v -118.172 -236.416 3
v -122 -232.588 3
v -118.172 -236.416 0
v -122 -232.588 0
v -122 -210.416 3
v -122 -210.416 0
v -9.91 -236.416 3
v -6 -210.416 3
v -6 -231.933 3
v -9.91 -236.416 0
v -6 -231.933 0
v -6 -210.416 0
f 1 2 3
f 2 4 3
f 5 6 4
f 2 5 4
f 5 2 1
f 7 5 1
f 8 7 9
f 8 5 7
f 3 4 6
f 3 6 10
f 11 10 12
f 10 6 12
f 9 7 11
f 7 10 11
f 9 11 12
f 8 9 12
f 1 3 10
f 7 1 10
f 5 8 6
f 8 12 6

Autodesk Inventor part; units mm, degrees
ref_plane "YZ Plane" through (0, 0, 0) normal (1, 0, 0) x (0, 1, 0)
ref_plane "XZ Plane" through (0, 0, 0) normal (0, 1, 0) x (-1, 0, 0)
ref_plane "Work Plane1" through (0, 0, 0) normal (0, 0, 1) x (1, 0, 0)
sketch "Sketch1" plane through (0, 0, 0) normal (0, 0, 1) x (1, 0, 0)
  line L0 (-109, -242.4163) -> (-109, -238.4163)
  line L1 (-119, -238.4163) -> (-109, -238.4163)
  arc A0 (-124, -233.4163) -> (-119, -238.4163) centre (-119, -233.4163) ccw
  line L2 (-124, -154.5344) -> (-124, -233.4163)
  arc A1 (-123.8494, -153.3167) -> (-124, -154.5344) centre (-119, -154.5344) ccw
  line L3 (-103.571, -72.5602) -> (-123.8494, -153.3167)
  arc A2 (-103.1284, -71.4158) -> (-103.571, -72.5602) centre (-98.7216, -73.7779) ccw
  line L4 (-68.4069, -6.6379) -> (-103.1284, -71.4158)
  arc A3 (-59.5931, -6.6379) -> (-68.4069, -6.6379) centre (-64, -9) ccw
  line L5 (-24.8716, -71.4158) -> (-59.5931, -6.6379)
  arc A4 (-24.429, -72.5602) -> (-24.8716, -71.4158) centre (-29.2784, -73.7779) ccw
  line L6 (-4.1506, -153.3167) -> (-24.429, -72.5602)
  arc A5 (-4, -154.5344) -> (-4.1506, -153.3167) centre (-9, -154.5344) ccw
  line L7 (-4, -233.4163) -> (-4, -154.5344)
  arc A6 (-9, -238.4163) -> (-4, -233.4163) centre (-9, -233.4163) ccw
  line L8 (-19, -238.4163) -> (-9, -238.4163)
  line L9 (-19, -238.4163) -> (-19, -242.4163)
  line L10 (-9, -242.4163) -> (-19, -242.4163)
  arc A7 (-9, -242.4163) -> (0, -233.4163) centre (-9, -233.4163) ccw
  line L11 (0, -154.5344) -> (0, -233.4163)
  arc A8 (0, -154.5344) -> (-0.271, -152.3425) centre (-9, -154.5344) ccw
  line L12 (-20.5494, -71.586) -> (-0.271, -152.3425)
  arc A9 (-20.5494, -71.586) -> (-21.3461, -69.5261) centre (-29.2784, -73.7779) ccw
  line L13 (-56.0677, -4.7482) -> (-21.3461, -69.5261)
  arc A10 (-56.0677, -4.7482) -> (-71.9323, -4.7482) centre (-64, -9) ccw
  line L14 (-106.6539, -69.5261) -> (-71.9323, -4.7482)
  arc A11 (-106.6539, -69.5261) -> (-107.4506, -71.586) centre (-98.7216, -73.7779) ccw
  line L15 (-127.729, -152.3425) -> (-107.4506, -71.586)
  arc A12 (-127.729, -152.3425) -> (-128, -154.5344) centre (-119, -154.5344) ccw
  line L16 (-128, -233.4163) -> (-128, -154.5344)
  arc A13 (-128, -233.4163) -> (-119, -242.4163) centre (-119, -233.4163) ccw
  line L17 (-109, -242.4163) -> (-119, -242.4163)
  line L18 (-124, -208.4163) -> (-4, -208.4163)
  line L19 (-4, -208.4163) -> (-4, -232.6822)
  line L20 (-9, -238.4163) -> (-119, -238.4163)
  line L21 (-124, -233.4163) -> (-124, -208.4163)
  line L22 (-119, -238.4163) -> (-124, -233.4163)
  line L23 (-9, -238.4163) -> (-4, -232.6822)
  line L24 (-118.1716, -236.4163) -> (-9.9096, -236.4163)
  line L25 (-9.9096, -236.4163) -> (-6, -231.9327)
  line L26 (-6, -231.9327) -> (-6, -210.4163)
  line L27 (-6, -210.4163) -> (-122, -210.4163)
  line L28 (-122, -210.4163) -> (-122, -232.5878)
  line L29 (-122, -232.5878) -> (-118.1716, -236.4163)
  point P0 (0, 0)
  dimension "d3" = 45
  dimension "d4" = 41.088
  dimension "d5" = 30
  dimension "d6" = 2
extrude "Plate1" add sketch "Sketch1" along normal blind 3 contours L29 L28 L27 L26 L25 L24
ref_plane "midtplan" through (-64, -232.5878, 0) normal (-1, 0, 0) x (0, 0, 1)
equation "\"d7\" = Thickness"
equation "\"Thickness\" = pladetykkelse"
equation "\"BendRadius\" = 1.5 * Thickness"
equation "\"BendReliefWidth\" = Thickness"
equation "\"BendReliefDepth\" = 0.5 * Thickness"
equation "\"CornerReliefSize\" = 4 * Thickness"
equation "\"MinimumRemnant\" = 2 * Thickness"
equation "\"TransitionRadius\" = BendRadius"
equation "\"JacobiRadiusSize\" = BendRadius"
equation "\"GapSize\" = Thickness"
equation "\"pladetykkelse\" = 3"
equation "\"trappevinkel\" = 34.3deg"
equation "\"trappestifter_dia\" = 25"
equation "\"trappestifter_huldia\" = 25.8"
equation "\"trappestifter_skraa_huldia\" = 26.6"
equation "\"trappestifter_laengde\" = 228"
equation "\"perforeringsbredde\" = 6"
equation "\"perforeringshullaengde\" = 62.8"
equation "\"perforeringshullaengde_top\" = 61"
equation "\"perforeringshullaengde_bund\" = 61.6"
equation "\"perforeringsoffset\" = 8"
equation "\"perforeringsoffset_top\" = 8"
equation "\"perforeringsoffset_bund\" = 8"
equation "\"laskehul_dia\" = 13"
equation "\"balusterhul_udvidelse\" = 1"
equation "\"trinbredde\" = 1884"
properties part number "skot opad" material "S355MC"
